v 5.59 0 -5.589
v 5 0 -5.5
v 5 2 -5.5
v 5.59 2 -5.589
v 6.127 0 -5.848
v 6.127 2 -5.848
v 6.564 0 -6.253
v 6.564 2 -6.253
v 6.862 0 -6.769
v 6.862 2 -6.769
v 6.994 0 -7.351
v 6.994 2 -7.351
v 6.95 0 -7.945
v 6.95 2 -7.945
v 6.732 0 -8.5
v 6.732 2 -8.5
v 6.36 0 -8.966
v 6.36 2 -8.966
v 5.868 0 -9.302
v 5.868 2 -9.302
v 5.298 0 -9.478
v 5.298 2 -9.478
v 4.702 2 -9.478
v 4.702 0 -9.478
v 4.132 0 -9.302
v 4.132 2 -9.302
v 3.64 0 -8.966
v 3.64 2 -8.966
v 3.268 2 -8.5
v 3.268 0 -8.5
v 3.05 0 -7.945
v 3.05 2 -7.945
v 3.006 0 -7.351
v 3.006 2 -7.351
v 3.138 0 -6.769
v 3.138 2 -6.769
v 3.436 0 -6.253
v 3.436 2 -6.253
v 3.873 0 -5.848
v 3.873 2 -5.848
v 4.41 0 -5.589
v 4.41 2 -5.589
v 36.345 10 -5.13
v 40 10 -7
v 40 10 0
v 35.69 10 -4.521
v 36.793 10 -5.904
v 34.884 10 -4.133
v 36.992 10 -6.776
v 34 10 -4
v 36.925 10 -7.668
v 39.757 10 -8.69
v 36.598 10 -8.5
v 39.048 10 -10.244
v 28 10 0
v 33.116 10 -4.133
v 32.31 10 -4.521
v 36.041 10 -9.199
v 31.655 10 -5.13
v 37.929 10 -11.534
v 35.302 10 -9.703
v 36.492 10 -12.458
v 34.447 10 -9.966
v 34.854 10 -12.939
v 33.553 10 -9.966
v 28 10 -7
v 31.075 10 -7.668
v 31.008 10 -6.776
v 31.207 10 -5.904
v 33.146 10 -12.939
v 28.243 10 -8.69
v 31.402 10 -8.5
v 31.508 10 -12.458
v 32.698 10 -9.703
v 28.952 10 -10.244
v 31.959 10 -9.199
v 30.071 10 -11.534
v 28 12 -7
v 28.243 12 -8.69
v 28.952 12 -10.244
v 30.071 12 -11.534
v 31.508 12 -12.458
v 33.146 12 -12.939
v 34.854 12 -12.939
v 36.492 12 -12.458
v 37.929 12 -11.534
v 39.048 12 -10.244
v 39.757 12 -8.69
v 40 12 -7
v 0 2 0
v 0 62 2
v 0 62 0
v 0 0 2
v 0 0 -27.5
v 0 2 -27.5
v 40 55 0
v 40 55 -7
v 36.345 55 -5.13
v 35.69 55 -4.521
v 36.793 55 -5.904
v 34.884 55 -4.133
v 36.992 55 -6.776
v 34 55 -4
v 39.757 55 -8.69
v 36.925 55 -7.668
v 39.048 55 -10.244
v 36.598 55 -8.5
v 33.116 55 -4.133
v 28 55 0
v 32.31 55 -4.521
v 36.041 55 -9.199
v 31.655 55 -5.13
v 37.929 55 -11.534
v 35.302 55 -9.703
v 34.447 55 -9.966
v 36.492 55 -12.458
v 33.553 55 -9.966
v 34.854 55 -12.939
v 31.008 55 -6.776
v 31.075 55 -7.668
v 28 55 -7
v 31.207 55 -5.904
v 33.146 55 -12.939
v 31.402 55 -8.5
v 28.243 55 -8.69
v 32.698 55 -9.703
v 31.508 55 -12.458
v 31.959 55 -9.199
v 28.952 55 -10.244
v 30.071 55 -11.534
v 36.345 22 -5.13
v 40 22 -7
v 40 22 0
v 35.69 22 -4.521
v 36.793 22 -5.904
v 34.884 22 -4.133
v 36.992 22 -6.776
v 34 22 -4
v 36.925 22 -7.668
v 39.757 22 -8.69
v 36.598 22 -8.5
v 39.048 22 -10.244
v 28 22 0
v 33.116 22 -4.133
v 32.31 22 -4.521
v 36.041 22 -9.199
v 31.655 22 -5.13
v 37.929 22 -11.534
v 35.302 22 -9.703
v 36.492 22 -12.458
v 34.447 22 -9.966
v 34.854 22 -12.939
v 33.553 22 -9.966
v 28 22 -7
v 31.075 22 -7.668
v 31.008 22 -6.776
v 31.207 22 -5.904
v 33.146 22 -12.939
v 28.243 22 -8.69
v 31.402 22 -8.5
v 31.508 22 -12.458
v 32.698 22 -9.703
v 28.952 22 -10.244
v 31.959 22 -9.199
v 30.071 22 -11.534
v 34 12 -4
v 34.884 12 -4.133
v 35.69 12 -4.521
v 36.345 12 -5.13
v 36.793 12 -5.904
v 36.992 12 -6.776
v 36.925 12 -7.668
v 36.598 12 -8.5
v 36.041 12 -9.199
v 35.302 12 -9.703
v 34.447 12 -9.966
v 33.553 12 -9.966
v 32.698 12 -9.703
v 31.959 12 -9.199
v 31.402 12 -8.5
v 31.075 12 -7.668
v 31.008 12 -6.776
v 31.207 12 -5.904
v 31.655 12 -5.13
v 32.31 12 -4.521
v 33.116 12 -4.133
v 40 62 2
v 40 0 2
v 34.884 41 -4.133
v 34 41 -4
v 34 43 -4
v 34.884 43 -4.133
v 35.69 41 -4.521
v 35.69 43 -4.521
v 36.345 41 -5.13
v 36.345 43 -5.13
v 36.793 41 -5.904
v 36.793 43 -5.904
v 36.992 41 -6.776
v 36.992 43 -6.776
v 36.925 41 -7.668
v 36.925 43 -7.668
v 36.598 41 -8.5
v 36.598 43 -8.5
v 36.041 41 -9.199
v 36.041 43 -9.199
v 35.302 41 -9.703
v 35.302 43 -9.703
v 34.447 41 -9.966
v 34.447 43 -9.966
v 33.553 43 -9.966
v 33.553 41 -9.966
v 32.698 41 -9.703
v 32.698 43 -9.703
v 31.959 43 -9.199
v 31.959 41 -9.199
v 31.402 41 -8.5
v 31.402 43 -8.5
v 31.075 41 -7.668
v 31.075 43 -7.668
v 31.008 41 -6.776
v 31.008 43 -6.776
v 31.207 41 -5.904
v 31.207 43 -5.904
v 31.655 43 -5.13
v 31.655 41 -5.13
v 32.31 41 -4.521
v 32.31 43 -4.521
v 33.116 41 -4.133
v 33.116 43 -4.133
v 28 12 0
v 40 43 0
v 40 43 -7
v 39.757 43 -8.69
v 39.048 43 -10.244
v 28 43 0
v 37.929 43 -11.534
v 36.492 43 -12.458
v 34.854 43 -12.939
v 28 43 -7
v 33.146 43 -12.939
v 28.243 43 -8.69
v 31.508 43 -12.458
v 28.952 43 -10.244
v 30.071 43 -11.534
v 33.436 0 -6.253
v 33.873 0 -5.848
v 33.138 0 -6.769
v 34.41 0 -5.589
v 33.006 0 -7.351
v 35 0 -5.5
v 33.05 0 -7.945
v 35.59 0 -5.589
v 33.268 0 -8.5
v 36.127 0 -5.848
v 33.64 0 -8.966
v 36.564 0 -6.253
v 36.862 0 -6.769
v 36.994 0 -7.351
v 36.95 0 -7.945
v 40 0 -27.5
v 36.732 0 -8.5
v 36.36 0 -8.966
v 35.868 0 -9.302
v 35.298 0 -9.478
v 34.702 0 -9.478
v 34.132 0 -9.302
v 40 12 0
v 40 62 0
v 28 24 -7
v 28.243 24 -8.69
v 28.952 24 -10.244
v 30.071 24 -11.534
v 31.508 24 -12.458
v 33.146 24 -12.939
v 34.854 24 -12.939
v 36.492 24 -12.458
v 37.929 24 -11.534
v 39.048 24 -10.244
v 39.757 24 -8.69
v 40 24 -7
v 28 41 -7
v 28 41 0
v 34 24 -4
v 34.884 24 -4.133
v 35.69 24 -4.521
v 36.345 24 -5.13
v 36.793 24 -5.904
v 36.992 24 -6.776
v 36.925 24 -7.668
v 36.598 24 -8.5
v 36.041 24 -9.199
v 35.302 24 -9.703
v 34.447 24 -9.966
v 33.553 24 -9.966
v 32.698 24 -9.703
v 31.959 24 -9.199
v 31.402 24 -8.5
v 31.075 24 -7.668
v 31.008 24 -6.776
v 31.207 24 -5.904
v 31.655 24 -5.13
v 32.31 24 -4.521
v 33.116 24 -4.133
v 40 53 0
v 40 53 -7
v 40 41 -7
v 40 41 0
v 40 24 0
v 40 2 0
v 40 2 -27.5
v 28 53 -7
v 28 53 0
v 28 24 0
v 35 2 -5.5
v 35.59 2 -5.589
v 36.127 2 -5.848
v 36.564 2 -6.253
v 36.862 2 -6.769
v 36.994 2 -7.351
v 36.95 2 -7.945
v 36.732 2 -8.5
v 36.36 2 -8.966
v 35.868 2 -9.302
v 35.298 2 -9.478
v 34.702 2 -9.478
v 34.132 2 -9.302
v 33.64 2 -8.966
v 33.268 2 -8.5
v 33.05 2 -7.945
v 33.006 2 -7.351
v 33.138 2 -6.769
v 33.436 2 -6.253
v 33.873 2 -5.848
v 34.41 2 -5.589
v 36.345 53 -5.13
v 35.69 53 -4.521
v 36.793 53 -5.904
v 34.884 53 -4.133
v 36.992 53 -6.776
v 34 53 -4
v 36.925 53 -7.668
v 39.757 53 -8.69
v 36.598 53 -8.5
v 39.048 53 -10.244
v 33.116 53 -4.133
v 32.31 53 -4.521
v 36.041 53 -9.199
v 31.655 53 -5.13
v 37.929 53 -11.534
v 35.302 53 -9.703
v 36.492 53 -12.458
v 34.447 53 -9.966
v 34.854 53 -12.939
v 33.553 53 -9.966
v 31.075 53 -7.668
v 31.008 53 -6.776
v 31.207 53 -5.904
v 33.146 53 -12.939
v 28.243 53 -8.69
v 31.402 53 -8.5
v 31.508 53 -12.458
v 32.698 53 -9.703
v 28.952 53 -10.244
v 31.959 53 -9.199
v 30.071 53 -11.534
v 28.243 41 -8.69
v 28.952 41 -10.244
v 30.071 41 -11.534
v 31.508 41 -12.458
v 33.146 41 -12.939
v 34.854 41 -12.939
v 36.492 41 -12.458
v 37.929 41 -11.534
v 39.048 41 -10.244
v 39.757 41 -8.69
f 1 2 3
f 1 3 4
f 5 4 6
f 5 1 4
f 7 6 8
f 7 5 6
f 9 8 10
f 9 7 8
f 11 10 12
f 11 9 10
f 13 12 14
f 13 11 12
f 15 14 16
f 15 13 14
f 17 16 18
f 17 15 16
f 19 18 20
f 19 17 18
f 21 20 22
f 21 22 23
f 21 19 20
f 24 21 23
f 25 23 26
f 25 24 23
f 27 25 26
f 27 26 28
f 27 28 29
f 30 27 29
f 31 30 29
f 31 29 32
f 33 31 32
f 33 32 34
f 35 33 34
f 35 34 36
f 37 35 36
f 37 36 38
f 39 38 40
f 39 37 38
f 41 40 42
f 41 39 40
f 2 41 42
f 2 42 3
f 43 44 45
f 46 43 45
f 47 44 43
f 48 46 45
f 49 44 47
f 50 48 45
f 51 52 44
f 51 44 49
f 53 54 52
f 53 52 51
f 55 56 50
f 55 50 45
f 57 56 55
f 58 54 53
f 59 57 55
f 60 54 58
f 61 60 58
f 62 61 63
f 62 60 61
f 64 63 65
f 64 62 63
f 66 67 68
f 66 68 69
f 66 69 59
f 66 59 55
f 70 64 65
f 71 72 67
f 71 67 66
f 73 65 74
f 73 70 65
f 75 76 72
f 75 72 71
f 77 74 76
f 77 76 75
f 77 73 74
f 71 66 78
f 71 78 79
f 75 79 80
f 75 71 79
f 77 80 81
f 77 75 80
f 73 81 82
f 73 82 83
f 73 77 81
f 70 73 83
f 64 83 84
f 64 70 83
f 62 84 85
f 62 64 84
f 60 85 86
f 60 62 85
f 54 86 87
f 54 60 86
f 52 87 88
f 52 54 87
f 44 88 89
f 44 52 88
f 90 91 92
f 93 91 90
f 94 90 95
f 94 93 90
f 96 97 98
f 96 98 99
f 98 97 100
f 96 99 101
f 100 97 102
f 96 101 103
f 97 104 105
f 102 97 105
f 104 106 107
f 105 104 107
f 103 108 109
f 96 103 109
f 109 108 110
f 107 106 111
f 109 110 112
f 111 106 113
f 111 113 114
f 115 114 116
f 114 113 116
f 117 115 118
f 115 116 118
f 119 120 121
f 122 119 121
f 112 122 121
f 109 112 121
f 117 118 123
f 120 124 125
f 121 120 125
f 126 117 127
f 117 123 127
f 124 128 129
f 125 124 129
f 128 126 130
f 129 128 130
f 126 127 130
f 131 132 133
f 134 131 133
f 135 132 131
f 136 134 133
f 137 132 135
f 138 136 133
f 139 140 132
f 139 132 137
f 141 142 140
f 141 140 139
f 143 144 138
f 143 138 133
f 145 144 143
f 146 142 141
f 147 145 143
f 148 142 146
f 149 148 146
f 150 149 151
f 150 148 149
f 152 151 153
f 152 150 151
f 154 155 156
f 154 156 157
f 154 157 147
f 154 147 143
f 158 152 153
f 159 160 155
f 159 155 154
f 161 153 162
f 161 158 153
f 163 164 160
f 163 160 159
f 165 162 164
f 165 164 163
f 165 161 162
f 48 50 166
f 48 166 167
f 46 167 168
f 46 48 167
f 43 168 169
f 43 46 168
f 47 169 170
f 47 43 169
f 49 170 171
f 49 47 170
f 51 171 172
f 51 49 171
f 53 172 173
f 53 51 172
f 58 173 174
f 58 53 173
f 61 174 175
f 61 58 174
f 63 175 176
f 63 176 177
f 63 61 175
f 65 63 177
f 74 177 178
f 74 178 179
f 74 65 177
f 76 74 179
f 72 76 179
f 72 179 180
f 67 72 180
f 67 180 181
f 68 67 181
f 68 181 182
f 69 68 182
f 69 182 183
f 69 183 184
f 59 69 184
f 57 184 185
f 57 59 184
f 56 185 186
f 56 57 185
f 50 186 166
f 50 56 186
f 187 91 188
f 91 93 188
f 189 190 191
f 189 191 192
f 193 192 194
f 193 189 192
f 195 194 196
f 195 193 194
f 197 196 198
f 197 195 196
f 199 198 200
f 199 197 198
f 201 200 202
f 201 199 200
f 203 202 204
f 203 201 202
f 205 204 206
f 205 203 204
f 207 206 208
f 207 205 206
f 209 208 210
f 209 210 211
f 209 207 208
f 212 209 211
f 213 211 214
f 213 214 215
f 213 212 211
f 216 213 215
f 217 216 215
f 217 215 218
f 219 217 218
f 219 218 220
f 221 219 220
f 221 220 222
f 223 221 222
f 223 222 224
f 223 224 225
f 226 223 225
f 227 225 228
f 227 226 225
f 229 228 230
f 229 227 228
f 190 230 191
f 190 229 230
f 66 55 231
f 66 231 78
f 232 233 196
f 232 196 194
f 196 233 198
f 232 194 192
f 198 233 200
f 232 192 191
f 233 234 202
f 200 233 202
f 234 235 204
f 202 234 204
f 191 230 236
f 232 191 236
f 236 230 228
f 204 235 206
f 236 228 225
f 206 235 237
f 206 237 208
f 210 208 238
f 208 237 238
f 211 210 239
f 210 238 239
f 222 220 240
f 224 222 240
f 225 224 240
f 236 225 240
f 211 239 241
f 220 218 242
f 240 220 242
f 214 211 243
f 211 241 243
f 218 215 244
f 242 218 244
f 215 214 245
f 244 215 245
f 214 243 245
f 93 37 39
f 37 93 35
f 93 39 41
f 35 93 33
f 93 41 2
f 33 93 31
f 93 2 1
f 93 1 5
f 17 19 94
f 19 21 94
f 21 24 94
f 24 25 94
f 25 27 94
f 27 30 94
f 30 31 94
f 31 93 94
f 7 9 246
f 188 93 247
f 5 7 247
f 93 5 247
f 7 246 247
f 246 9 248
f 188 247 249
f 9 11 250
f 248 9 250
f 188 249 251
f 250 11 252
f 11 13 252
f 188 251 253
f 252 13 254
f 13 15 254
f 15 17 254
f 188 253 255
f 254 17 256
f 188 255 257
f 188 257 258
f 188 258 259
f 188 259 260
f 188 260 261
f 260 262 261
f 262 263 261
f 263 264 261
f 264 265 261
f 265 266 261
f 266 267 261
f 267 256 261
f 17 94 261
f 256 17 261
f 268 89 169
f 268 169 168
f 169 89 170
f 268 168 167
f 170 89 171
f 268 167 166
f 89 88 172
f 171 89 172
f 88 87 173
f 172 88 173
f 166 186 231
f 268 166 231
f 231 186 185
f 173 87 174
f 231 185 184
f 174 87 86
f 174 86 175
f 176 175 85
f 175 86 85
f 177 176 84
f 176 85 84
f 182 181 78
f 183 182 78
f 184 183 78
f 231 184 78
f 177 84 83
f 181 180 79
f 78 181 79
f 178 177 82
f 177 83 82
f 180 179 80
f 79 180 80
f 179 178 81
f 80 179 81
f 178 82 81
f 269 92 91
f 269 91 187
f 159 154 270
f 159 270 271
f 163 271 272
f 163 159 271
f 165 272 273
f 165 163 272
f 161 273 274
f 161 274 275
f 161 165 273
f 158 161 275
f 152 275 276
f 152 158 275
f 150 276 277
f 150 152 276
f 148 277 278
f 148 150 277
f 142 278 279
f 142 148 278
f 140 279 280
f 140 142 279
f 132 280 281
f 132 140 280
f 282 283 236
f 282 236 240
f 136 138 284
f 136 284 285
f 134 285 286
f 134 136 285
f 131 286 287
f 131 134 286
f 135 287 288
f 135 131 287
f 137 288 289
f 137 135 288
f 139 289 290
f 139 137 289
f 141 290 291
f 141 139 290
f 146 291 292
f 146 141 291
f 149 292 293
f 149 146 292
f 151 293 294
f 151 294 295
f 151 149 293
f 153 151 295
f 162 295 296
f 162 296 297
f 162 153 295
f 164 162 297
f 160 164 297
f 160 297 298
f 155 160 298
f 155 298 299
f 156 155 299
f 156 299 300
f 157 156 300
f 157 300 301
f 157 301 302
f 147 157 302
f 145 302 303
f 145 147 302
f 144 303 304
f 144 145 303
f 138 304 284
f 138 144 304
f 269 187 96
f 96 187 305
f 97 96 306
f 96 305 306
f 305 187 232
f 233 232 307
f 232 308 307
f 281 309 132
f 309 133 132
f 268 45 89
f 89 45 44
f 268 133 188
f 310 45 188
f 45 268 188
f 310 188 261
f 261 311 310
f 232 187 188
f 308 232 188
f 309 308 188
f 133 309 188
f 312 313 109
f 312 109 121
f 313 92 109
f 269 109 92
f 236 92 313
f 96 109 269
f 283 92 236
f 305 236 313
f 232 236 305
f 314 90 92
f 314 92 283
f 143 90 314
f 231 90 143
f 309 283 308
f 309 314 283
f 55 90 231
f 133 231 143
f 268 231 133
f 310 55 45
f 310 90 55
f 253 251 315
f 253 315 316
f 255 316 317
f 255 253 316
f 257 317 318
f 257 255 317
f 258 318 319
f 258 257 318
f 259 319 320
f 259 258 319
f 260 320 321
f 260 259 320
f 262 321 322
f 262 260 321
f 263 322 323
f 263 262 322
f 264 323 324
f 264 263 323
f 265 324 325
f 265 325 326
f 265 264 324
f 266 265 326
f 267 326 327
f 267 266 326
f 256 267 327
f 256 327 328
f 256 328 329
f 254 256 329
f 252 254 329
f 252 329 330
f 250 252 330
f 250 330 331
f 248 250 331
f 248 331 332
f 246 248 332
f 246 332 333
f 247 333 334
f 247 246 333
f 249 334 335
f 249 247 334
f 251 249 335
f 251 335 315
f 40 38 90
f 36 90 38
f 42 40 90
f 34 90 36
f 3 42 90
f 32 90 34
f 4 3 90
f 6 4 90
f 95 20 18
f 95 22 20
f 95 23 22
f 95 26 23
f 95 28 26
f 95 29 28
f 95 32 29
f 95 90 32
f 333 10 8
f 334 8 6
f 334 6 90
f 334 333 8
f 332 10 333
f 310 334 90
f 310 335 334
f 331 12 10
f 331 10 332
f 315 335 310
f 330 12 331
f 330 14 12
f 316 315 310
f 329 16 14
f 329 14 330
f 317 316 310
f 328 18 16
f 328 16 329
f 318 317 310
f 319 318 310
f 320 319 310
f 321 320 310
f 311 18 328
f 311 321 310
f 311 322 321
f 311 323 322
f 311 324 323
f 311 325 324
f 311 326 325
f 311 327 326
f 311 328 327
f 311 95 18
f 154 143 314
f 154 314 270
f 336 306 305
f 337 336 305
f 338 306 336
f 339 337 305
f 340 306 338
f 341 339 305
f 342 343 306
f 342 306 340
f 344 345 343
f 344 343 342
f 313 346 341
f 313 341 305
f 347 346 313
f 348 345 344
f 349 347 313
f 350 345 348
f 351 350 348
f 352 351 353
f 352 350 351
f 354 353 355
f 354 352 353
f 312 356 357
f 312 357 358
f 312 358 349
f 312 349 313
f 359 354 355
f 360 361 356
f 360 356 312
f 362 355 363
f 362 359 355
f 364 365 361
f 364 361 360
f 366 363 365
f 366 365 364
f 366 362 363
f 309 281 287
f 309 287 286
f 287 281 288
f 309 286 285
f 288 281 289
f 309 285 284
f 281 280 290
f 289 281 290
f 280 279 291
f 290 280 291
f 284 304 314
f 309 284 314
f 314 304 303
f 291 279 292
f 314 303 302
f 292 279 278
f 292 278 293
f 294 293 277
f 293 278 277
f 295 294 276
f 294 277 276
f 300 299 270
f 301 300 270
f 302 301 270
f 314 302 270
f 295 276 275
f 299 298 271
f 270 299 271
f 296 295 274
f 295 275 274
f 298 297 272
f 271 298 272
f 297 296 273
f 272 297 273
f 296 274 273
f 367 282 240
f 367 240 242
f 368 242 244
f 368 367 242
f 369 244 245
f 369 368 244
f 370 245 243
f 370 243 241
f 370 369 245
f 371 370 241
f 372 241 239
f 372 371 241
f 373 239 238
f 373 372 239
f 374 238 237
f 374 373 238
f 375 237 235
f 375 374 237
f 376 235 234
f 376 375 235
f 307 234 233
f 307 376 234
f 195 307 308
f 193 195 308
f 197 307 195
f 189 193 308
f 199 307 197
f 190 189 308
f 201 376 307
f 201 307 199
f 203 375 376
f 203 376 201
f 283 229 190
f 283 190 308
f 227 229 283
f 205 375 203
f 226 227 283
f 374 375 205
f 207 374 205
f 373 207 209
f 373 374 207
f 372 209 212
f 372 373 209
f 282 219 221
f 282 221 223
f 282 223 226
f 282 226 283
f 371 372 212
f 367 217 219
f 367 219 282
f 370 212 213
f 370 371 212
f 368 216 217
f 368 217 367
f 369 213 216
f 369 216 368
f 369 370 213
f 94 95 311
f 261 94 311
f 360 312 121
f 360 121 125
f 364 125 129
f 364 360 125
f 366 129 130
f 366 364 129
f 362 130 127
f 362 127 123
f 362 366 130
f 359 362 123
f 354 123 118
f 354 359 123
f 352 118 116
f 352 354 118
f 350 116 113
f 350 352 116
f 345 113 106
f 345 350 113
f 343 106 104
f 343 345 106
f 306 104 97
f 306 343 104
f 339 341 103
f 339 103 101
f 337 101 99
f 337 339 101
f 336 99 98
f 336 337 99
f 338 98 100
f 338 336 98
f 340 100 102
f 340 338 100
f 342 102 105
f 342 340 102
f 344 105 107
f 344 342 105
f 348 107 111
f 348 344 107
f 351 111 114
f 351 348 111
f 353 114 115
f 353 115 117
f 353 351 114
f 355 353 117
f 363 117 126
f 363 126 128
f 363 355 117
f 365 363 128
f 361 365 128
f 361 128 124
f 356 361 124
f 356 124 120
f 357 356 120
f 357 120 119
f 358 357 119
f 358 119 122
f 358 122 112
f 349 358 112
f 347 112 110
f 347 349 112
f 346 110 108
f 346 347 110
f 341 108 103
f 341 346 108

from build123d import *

# Parameters (mm, degrees)
CROQUIS2_W               = 40
CROQUIS2_H               = 55
CROQUIS2_R               = 2
SALIENTE_EXTRUIR1_DEPTH  = 2
CROQUIS3_W               = 40
CROQUIS3_H               = 2
SALIENTE_EXTRUIR2_DEPTH  = 42
CROQUIS4_R               = 3
SALIENTE_EXTRUIR3_DEPTH  = 2
MATRIZL1_COUNT           = 2
MATRIZL1_PITCH           = 12
CROQUIS6_W               = 40
CROQUIS6_H               = 27.5
CORTAR_EXTRUIR1_DEPTH    = 79.89866919
CROQUIS7_W               = 40
CROQUIS7_H               = 2
SALIENTE_EXTRUIR5_DEPTH  = 20
MATRIZL2_COPY_1_SKETCH_R = 3
MATRIZL2_COPY_1_DEPTH    = 2
MATRIZL2_COPY_2_SKETCH_R = 3
MATRIZL2_COPY_2_DEPTH    = 2


with BuildPart() as part:
    # Croquis2 → Saliente-Extruir1 (new body)
    with BuildSketch(Plane(origin=(0, 0, 0), x_dir=(1, 0, 0), z_dir=(0, 1, 0))):
        with Locations((20, 27.5)):
            Rectangle(CROQUIS2_W, CROQUIS2_H)
        with Locations(Location((5, 47.5, 0), (0, 0, 270))):
            Circle(CROQUIS2_R, mode=Mode.SUBTRACT)
        with Locations(Location((35, 47.5, 0), (0, 0, 270))):
            Circle(CROQUIS2_R, mode=Mode.SUBTRACT)
        with Locations(Location((35, 7.5, 0), (0, 0, 270))):
            Circle(CROQUIS2_R, mode=Mode.SUBTRACT)
        with Locations(Location((5, 7.5, 0), (0, 0, 270))):
            Circle(CROQUIS2_R, mode=Mode.SUBTRACT)
    extrude(amount=SALIENTE_EXTRUIR1_DEPTH)

    # Croquis3 → Saliente-Extruir2 (add)
    with BuildSketch(Plane(origin=(0, 0, 0), x_dir=(1, 0, 0), z_dir=(0, 1, 0))):
        with Locations((20, -1)):
            Rectangle(CROQUIS3_W, CROQUIS3_H)
    extrude(amount=SALIENTE_EXTRUIR2_DEPTH)

    # Croquis4 → Saliente-Extruir3 (add)
    with BuildSketch(Plane(origin=(0, 22, 0), x_dir=(1, 0, 0), z_dir=(0, 1, 0))):
        with BuildLine():
            Line((40, 7), (40, 0))
            Line((40, 0), (28, 0))
            Line((28, 0), (28, 7))
            ThreePointArc((28, 7), (34, 13), (40, 7))
        make_face()
        with Locations(Location((34, 7, 0), (0, 0, 270))):
            Circle(CROQUIS4_R, mode=Mode.SUBTRACT)
    saliente_extruir3 = extrude(amount=SALIENTE_EXTRUIR3_DEPTH)

    # MatrizL1: Saliente-Extruir3 ×2
    with Locations(*[(0, -i * MATRIZL1_PITCH, 0) for i in range(1, MATRIZL1_COUNT)]):
        add(saliente_extruir3)

    # Croquis6 → Cortar-Extruir1 (cut, through all)
    with BuildSketch(Plane(origin=(0, 2, 0), x_dir=(1, 0, 0), z_dir=(0, 1, 0))):
        with Locations((20, 41.25)):
            Rectangle(CROQUIS6_W, CROQUIS6_H)
    extrude(amount=-CORTAR_EXTRUIR1_DEPTH, mode=Mode.SUBTRACT)

    # Croquis7 → Saliente-Extruir5 (add)
    with BuildSketch(Plane(origin=(0, 42, 0), x_dir=(1, 0, 0), z_dir=(0, 1, 0))):
        with Locations((20, -1)):
            Rectangle(CROQUIS7_W, CROQUIS7_H)
    extrude(amount=SALIENTE_EXTRUIR5_DEPTH)

    # MatrizL2 copy 1 sketch → MatrizL2 copy 1 (add)
    with BuildSketch(Plane(origin=(0, 41, 0), x_dir=(1, 0, 0), z_dir=(0, 1, 0))):
        with BuildLine():
            Line((40, 7), (40, 0))
            Line((40, 0), (28, 0))
            Line((28, 0), (28, 7))
            ThreePointArc((28, 7), (34, 13), (40, 7))
        make_face()
        with Locations(Location((34, 7, 0), (0, 0, 270))):
            Circle(MATRIZL2_COPY_1_SKETCH_R, mode=Mode.SUBTRACT)
    extrude(amount=MATRIZL2_COPY_1_DEPTH)

    # MatrizL2 copy 2 sketch → MatrizL2 copy 2 (add)
    with BuildSketch(Plane(origin=(0, 53, 0), x_dir=(1, 0, 0), z_dir=(0, 1, 0))):
        with BuildLine():
            Line((40, 7), (40, 0))
            Line((40, 0), (28, 0))
            Line((28, 0), (28, 7))
            ThreePointArc((28, 7), (34, 13), (40, 7))
        make_face()
        with Locations(Location((34, 7, 0), (0, 0, 270))):
            Circle(MATRIZL2_COPY_2_SKETCH_R, mode=Mode.SUBTRACT)
    extrude(amount=MATRIZL2_COPY_2_DEPTH)


solid = part.part
